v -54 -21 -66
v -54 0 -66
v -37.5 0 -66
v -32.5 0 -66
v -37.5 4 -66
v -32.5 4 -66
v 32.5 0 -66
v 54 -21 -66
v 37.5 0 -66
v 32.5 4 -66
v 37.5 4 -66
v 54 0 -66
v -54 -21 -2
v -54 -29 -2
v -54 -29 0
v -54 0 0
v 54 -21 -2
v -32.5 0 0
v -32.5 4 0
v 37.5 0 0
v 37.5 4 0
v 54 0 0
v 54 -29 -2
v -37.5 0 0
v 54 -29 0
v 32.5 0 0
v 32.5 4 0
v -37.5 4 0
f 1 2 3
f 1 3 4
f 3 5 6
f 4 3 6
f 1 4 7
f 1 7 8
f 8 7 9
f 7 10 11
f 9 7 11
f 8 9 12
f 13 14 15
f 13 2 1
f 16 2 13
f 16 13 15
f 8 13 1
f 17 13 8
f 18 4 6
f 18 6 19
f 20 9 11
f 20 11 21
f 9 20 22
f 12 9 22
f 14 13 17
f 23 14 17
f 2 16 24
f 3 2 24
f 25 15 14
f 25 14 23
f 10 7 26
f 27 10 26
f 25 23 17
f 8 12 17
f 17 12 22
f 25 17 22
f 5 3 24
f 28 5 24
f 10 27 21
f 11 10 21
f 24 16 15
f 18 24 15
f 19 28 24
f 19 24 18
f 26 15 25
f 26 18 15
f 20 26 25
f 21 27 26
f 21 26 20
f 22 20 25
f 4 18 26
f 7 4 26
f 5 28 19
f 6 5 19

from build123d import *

# Parameters (mm, degrees)
F0_W     = 5
F0_H     = 66
F0_W_2   = 16.5
F0_W_3   = 65
F1_DEPTH = 21
F2_DEPTH = 4
F3_W     = 108
F3_H     = 2
F4_DEPTH = 8


with BuildPart() as f1:
    # F0 (on Front) → F1 (new body)
    with BuildSketch(Plane.XZ):
        with Locations((-35, -33)):
            Rectangle(F0_W, F0_H)
        with Locations((-45.75, -33)):
            Rectangle(F0_W_2, F0_H)
        with Locations((0, -33)):
            Rectangle(F0_W_3, F0_H)
        with Locations((35, -33)):
            Rectangle(F0_W, F0_H)
        with Locations((45.75, -33)):
            Rectangle(F0_W_2, F0_H)
    extrude(amount=F1_DEPTH)

    # F0 (on Front) → F2 (join)
    with BuildSketch(Plane.XZ):
        with Locations((35, -33)):
            Rectangle(F0_W, F0_H)
        with Locations((-35, -33)):
            Rectangle(F0_W, F0_H)
    extrude(amount=-F2_DEPTH)

    # F3 (on face) → F4 (join)
    with BuildSketch(Plane.XZ.offset(21)):
        with Locations((0, -1)):
            Rectangle(F3_W, F3_H)
    extrude(amount=F4_DEPTH)


solid = f1.part
